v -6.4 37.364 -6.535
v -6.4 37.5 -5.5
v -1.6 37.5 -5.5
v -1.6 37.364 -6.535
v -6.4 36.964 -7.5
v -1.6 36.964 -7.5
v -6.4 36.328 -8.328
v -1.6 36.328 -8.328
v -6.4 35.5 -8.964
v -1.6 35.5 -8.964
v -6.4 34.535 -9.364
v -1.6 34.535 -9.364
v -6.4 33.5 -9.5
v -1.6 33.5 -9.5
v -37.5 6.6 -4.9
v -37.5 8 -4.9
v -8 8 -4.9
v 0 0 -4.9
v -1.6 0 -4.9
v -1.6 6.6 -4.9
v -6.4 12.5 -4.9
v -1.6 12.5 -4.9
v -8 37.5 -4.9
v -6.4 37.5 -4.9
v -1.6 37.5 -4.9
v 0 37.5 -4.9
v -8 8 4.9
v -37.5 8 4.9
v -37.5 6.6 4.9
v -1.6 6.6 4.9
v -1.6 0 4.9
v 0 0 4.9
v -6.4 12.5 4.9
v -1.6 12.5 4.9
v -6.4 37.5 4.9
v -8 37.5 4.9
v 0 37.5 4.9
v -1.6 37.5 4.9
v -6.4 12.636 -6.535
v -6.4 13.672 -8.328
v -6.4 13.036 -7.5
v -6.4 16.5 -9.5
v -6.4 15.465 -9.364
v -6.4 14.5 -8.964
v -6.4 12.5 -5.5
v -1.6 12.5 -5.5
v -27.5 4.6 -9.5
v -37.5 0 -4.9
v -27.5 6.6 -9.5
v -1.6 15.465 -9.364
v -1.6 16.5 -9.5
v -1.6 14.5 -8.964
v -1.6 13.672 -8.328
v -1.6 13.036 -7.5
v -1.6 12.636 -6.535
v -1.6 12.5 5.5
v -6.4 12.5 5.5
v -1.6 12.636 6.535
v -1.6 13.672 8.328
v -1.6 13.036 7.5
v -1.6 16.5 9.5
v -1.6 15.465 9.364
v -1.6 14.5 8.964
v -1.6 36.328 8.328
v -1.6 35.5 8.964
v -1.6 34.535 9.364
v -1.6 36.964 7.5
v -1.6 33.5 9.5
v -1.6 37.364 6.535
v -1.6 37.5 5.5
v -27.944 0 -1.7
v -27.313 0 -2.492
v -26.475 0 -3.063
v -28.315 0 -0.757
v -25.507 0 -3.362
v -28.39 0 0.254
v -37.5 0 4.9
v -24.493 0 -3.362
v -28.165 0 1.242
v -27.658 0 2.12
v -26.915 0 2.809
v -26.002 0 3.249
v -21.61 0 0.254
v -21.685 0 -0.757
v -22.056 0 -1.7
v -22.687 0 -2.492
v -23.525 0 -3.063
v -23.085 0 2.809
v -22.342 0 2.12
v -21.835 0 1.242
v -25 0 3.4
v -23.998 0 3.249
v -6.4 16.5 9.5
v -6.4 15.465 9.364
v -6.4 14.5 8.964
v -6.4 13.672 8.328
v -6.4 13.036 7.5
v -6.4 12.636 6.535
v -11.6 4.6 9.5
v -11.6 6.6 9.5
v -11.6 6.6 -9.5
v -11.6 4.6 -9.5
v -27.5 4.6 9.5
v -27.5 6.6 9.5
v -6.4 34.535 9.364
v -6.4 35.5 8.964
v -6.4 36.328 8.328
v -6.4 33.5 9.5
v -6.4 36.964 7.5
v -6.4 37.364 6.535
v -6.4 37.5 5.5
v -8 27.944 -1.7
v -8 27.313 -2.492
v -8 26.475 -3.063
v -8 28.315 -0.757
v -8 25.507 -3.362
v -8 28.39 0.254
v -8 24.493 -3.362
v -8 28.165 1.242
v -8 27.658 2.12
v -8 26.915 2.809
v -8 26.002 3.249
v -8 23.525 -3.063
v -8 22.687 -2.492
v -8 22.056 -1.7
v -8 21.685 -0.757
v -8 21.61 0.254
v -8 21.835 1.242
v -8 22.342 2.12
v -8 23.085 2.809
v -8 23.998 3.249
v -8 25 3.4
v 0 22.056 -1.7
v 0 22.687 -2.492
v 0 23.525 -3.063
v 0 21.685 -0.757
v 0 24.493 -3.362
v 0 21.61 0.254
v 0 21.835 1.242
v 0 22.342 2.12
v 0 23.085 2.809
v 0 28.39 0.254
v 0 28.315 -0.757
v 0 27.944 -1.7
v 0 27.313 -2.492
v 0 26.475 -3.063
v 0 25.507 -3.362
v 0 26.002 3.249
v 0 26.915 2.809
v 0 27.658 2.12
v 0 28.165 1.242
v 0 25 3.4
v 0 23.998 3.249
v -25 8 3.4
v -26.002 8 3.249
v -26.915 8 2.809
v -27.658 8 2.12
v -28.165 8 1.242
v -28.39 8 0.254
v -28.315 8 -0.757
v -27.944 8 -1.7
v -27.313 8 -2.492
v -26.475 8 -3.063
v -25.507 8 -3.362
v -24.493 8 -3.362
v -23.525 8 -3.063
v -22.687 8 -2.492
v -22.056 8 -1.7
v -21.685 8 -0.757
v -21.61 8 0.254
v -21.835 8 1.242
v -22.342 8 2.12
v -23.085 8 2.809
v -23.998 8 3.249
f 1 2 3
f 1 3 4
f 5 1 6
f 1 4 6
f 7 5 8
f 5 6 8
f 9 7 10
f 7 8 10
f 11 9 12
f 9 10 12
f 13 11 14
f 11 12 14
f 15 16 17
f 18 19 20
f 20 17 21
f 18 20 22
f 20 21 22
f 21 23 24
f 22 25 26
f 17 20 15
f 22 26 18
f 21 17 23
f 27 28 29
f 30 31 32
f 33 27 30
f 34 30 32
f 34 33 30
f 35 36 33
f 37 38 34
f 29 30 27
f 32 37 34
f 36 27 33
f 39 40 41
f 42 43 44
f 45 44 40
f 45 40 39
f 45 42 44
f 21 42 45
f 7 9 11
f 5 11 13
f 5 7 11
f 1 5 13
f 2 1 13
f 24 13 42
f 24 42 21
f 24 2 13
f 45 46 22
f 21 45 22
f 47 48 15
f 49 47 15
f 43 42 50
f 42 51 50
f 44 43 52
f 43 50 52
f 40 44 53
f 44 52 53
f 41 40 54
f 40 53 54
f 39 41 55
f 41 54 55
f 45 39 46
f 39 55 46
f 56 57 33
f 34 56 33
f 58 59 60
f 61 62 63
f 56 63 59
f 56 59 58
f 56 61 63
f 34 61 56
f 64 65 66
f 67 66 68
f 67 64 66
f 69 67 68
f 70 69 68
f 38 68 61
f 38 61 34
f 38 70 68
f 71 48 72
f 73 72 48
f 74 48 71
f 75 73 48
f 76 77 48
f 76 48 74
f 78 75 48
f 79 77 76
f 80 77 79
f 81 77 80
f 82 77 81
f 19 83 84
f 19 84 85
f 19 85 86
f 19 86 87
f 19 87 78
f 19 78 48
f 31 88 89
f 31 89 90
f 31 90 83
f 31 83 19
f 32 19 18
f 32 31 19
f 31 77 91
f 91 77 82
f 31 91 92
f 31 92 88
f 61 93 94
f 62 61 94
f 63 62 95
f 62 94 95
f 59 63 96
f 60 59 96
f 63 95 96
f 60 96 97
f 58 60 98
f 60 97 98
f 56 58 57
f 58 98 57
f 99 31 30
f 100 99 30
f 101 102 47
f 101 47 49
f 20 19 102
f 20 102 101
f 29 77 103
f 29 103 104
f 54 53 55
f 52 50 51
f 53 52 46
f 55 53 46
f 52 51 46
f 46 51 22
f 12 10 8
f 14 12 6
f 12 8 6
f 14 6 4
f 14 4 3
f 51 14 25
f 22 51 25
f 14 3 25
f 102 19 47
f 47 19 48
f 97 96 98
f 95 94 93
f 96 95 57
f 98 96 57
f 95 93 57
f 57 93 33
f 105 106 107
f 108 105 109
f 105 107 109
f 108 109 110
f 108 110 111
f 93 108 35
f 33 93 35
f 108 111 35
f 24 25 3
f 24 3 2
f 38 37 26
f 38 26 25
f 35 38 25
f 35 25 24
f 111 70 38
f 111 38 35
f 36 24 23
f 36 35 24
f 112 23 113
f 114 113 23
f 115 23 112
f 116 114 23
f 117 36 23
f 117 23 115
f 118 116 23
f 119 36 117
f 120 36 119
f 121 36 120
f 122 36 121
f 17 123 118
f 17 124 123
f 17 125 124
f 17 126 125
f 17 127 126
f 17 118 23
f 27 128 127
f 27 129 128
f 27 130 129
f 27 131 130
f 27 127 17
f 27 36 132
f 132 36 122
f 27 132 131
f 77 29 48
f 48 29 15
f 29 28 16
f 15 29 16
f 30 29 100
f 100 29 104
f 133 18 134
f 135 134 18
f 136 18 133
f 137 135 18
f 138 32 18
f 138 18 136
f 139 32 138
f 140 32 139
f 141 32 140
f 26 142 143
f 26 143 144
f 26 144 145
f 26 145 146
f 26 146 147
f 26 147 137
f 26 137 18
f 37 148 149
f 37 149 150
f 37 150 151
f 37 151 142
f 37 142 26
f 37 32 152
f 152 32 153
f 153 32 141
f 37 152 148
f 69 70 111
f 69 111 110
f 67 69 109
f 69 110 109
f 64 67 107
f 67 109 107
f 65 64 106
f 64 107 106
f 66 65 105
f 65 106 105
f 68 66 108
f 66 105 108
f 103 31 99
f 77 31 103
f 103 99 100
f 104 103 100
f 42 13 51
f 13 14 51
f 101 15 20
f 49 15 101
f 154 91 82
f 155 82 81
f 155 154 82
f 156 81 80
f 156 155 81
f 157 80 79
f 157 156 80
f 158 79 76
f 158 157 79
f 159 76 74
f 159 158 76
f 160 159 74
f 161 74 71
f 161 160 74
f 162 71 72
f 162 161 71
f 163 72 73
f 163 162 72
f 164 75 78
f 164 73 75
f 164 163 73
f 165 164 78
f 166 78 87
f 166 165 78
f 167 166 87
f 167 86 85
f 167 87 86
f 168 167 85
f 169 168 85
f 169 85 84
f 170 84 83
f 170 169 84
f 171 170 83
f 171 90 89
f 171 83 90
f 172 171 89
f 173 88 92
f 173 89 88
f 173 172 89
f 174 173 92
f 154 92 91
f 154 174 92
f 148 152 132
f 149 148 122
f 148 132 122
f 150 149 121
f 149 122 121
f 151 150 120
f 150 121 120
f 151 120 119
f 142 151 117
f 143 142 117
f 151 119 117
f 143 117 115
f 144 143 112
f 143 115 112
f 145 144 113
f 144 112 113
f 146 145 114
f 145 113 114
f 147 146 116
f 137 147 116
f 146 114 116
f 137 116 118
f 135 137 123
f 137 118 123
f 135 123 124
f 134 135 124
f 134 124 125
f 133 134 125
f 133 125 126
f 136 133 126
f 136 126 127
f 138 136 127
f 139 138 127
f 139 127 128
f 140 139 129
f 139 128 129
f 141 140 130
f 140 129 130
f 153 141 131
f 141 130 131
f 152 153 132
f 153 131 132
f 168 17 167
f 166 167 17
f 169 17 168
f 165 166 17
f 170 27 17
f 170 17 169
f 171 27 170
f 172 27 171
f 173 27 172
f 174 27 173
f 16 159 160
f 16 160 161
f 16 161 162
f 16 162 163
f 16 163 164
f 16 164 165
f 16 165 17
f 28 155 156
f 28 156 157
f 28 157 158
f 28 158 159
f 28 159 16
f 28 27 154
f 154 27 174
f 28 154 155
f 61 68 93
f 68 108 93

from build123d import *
from OCP.BRepFilletAPI import BRepFilletAPI_MakeChamfer

# Parameters (mm, degrees)
EXTRUDE_1_DEPTH  = 4.9
EXTRUDE_2_DEPTH  = 35.9
CHAMFER_1_SIZE   = 10
CHAMFER_1_SIZE2  = 4.6
CHAMFER_2_SIZE   = 10
CHAMFER_2_SIZE_2 = 4.6
EXTRUDE_3_DEPTH  = 2.4


with BuildPart() as part:
    # 草图1 → 凸台-拉伸1 (new, symmetric)
    with BuildSketch(Plane.XY):
        Polygon((-37.5, 0), (0, 0), (0, 37.5), (-8, 37.5), (-8, 8), (-37.5, 8), align=None)
    extrude(amount=EXTRUDE_1_DEPTH, both=True)

    # 草图3 → 凸台-拉伸2 (add)
    with BuildSketch(Plane.ZY.offset(37.5)):
        Polygon((-4.9, 0), (-9.5, 4.6), (-9.5, 6.6), (-4.9, 6.6), align=None)
        Polygon((4.9, 6.6), (4.9, 0), (9.5, 4.6), (9.5, 6.6), align=None)
    extrude(amount=-EXTRUDE_2_DEPTH)

    # 倒角1: one chamfer whose edges measure the first distance from different faces: ONE call of the kernel's chamfer builder (chamfer() names one face for all edges)
    chamfer_1_edges_1 = [part.edges().sort_by_distance(p)[0] for p in [
        (-37.5, 5.6, 9.5),
    ]]
    chamfer_1_side_1 = [part.faces().sort_by_distance(p)[0] for p in [
        (-19.55, 5.6, 9.5),
    ]]
    chamfer_1_edges_2 = [part.edges().sort_by_distance(p)[0] for p in [
        (-37.5, 5.6, -9.5),
    ]]
    chamfer_1_side_2 = [part.faces().sort_by_distance(p)[0] for p in [
        (-19.55, 5.6, -9.5),
    ]]
    chamfer_1 = BRepFilletAPI_MakeChamfer(part.part.solid().wrapped)
    for e in chamfer_1_edges_1:
        chamfer_1.Add(CHAMFER_1_SIZE, CHAMFER_1_SIZE2, e.wrapped, chamfer_1_side_1[0].wrapped)  # the first distance lies on this face
    for e in chamfer_1_edges_2:
        chamfer_1.Add(CHAMFER_1_SIZE, CHAMFER_1_SIZE2, e.wrapped, chamfer_1_side_2[0].wrapped)  # the first distance lies on this face
    add(Compound.cast(chamfer_1.Shape()), mode=Mode.REPLACE)

    # 倒角2
    chamfer_2_edges_1 = [part.edges().sort_by_distance(p)[0] for p in [
        (-1.6, 5.6, 9.5),
    ]]
    chamfer_2_side_1 = [part.faces().sort_by_distance(p)[0] for p in [
        (-1.692, 5.6, 9.5),
    ]]
    chamfer_2_edges_2 = [part.edges().sort_by_distance(p)[0] for p in [
        (-1.6, 5.6, -9.5),
    ]]
    chamfer_2_side_2 = [part.faces().sort_by_distance(p)[0] for p in [
        (-1.692, 5.6, -9.5),
    ]]
    chamfer_2 = BRepFilletAPI_MakeChamfer(part.part.solid().wrapped)
    for e in chamfer_2_edges_1:
        chamfer_2.Add(CHAMFER_2_SIZE - 0.0001, CHAMFER_2_SIZE_2 - 0.0001, e.wrapped, chamfer_2_side_1[0].wrapped)
    for e in chamfer_2_edges_2:
        chamfer_2.Add(CHAMFER_2_SIZE - 0.0001, CHAMFER_2_SIZE_2 - 0.0001, e.wrapped, chamfer_2_side_2[0].wrapped)
    add(Compound.cast(chamfer_2.Shape()), mode=Mode.REPLACE)  # a hair under: the kernel refuses the full size

    # 草图5 → 凸台-拉伸3 (add, symmetric)
    with BuildSketch(Plane.ZY.offset(4)):
        with BuildLine():
            Line((-4.9, 37.5), (-5.5, 37.5))
            ThreePointArc((-5.5, 37.5), (-8.328427125, 36.328427125), (-9.5, 33.5))
            Line((-9.5, 33.5), (-9.5, 16.5))
            ThreePointArc((-9.5, 16.5), (-8.328427125, 13.671572875), (-5.5, 12.5))
            Line((-5.5, 12.5), (-4.9, 12.5))
            Line((-4.9, 12.5), (-4.9, 37.5))
        make_face()
        with BuildLine():
            Line((4.9, 12.5), (4.9, 37.5))
            Line((4.9, 37.5), (5.5, 37.5))
            ThreePointArc((5.5, 37.5), (8.328427125, 36.328427125), (9.5, 33.5))
            Line((9.5, 33.5), (9.5, 16.5))
            ThreePointArc((9.5, 16.5), (8.328427125, 13.671572875), (5.5, 12.5))
            Line((5.5, 12.5), (4.9, 12.5))
        make_face()
    extrude(amount=EXTRUDE_3_DEPTH, both=True)

    # 草图7 → M8 螺纹孔1 (revolve, cut)
    with BuildSketch(Plane(origin=(-25, 8, 0), x_dir=(0, 0, 1), z_dir=(1, 0, 0))):
        Polygon((0, 0), (0, 21.792926105), (3.4, 19.75), (3.4, 0), align=None)
    hole_wizard_m8_1 = revolve(axis=Axis((-25, 14.35, 0), (0, -1, 0)), mode=Mode.SUBTRACT)

    # 镜向1: M8 螺纹孔1 across plane
    add(hole_wizard_m8_1.mirror(Plane(origin=(0, 0, 0), x_dir=(0, 0, 1), z_dir=(-0.7071067811865477, -0.7071067811865475, 0))), mode=Mode.SUBTRACT)


solid = part.part
